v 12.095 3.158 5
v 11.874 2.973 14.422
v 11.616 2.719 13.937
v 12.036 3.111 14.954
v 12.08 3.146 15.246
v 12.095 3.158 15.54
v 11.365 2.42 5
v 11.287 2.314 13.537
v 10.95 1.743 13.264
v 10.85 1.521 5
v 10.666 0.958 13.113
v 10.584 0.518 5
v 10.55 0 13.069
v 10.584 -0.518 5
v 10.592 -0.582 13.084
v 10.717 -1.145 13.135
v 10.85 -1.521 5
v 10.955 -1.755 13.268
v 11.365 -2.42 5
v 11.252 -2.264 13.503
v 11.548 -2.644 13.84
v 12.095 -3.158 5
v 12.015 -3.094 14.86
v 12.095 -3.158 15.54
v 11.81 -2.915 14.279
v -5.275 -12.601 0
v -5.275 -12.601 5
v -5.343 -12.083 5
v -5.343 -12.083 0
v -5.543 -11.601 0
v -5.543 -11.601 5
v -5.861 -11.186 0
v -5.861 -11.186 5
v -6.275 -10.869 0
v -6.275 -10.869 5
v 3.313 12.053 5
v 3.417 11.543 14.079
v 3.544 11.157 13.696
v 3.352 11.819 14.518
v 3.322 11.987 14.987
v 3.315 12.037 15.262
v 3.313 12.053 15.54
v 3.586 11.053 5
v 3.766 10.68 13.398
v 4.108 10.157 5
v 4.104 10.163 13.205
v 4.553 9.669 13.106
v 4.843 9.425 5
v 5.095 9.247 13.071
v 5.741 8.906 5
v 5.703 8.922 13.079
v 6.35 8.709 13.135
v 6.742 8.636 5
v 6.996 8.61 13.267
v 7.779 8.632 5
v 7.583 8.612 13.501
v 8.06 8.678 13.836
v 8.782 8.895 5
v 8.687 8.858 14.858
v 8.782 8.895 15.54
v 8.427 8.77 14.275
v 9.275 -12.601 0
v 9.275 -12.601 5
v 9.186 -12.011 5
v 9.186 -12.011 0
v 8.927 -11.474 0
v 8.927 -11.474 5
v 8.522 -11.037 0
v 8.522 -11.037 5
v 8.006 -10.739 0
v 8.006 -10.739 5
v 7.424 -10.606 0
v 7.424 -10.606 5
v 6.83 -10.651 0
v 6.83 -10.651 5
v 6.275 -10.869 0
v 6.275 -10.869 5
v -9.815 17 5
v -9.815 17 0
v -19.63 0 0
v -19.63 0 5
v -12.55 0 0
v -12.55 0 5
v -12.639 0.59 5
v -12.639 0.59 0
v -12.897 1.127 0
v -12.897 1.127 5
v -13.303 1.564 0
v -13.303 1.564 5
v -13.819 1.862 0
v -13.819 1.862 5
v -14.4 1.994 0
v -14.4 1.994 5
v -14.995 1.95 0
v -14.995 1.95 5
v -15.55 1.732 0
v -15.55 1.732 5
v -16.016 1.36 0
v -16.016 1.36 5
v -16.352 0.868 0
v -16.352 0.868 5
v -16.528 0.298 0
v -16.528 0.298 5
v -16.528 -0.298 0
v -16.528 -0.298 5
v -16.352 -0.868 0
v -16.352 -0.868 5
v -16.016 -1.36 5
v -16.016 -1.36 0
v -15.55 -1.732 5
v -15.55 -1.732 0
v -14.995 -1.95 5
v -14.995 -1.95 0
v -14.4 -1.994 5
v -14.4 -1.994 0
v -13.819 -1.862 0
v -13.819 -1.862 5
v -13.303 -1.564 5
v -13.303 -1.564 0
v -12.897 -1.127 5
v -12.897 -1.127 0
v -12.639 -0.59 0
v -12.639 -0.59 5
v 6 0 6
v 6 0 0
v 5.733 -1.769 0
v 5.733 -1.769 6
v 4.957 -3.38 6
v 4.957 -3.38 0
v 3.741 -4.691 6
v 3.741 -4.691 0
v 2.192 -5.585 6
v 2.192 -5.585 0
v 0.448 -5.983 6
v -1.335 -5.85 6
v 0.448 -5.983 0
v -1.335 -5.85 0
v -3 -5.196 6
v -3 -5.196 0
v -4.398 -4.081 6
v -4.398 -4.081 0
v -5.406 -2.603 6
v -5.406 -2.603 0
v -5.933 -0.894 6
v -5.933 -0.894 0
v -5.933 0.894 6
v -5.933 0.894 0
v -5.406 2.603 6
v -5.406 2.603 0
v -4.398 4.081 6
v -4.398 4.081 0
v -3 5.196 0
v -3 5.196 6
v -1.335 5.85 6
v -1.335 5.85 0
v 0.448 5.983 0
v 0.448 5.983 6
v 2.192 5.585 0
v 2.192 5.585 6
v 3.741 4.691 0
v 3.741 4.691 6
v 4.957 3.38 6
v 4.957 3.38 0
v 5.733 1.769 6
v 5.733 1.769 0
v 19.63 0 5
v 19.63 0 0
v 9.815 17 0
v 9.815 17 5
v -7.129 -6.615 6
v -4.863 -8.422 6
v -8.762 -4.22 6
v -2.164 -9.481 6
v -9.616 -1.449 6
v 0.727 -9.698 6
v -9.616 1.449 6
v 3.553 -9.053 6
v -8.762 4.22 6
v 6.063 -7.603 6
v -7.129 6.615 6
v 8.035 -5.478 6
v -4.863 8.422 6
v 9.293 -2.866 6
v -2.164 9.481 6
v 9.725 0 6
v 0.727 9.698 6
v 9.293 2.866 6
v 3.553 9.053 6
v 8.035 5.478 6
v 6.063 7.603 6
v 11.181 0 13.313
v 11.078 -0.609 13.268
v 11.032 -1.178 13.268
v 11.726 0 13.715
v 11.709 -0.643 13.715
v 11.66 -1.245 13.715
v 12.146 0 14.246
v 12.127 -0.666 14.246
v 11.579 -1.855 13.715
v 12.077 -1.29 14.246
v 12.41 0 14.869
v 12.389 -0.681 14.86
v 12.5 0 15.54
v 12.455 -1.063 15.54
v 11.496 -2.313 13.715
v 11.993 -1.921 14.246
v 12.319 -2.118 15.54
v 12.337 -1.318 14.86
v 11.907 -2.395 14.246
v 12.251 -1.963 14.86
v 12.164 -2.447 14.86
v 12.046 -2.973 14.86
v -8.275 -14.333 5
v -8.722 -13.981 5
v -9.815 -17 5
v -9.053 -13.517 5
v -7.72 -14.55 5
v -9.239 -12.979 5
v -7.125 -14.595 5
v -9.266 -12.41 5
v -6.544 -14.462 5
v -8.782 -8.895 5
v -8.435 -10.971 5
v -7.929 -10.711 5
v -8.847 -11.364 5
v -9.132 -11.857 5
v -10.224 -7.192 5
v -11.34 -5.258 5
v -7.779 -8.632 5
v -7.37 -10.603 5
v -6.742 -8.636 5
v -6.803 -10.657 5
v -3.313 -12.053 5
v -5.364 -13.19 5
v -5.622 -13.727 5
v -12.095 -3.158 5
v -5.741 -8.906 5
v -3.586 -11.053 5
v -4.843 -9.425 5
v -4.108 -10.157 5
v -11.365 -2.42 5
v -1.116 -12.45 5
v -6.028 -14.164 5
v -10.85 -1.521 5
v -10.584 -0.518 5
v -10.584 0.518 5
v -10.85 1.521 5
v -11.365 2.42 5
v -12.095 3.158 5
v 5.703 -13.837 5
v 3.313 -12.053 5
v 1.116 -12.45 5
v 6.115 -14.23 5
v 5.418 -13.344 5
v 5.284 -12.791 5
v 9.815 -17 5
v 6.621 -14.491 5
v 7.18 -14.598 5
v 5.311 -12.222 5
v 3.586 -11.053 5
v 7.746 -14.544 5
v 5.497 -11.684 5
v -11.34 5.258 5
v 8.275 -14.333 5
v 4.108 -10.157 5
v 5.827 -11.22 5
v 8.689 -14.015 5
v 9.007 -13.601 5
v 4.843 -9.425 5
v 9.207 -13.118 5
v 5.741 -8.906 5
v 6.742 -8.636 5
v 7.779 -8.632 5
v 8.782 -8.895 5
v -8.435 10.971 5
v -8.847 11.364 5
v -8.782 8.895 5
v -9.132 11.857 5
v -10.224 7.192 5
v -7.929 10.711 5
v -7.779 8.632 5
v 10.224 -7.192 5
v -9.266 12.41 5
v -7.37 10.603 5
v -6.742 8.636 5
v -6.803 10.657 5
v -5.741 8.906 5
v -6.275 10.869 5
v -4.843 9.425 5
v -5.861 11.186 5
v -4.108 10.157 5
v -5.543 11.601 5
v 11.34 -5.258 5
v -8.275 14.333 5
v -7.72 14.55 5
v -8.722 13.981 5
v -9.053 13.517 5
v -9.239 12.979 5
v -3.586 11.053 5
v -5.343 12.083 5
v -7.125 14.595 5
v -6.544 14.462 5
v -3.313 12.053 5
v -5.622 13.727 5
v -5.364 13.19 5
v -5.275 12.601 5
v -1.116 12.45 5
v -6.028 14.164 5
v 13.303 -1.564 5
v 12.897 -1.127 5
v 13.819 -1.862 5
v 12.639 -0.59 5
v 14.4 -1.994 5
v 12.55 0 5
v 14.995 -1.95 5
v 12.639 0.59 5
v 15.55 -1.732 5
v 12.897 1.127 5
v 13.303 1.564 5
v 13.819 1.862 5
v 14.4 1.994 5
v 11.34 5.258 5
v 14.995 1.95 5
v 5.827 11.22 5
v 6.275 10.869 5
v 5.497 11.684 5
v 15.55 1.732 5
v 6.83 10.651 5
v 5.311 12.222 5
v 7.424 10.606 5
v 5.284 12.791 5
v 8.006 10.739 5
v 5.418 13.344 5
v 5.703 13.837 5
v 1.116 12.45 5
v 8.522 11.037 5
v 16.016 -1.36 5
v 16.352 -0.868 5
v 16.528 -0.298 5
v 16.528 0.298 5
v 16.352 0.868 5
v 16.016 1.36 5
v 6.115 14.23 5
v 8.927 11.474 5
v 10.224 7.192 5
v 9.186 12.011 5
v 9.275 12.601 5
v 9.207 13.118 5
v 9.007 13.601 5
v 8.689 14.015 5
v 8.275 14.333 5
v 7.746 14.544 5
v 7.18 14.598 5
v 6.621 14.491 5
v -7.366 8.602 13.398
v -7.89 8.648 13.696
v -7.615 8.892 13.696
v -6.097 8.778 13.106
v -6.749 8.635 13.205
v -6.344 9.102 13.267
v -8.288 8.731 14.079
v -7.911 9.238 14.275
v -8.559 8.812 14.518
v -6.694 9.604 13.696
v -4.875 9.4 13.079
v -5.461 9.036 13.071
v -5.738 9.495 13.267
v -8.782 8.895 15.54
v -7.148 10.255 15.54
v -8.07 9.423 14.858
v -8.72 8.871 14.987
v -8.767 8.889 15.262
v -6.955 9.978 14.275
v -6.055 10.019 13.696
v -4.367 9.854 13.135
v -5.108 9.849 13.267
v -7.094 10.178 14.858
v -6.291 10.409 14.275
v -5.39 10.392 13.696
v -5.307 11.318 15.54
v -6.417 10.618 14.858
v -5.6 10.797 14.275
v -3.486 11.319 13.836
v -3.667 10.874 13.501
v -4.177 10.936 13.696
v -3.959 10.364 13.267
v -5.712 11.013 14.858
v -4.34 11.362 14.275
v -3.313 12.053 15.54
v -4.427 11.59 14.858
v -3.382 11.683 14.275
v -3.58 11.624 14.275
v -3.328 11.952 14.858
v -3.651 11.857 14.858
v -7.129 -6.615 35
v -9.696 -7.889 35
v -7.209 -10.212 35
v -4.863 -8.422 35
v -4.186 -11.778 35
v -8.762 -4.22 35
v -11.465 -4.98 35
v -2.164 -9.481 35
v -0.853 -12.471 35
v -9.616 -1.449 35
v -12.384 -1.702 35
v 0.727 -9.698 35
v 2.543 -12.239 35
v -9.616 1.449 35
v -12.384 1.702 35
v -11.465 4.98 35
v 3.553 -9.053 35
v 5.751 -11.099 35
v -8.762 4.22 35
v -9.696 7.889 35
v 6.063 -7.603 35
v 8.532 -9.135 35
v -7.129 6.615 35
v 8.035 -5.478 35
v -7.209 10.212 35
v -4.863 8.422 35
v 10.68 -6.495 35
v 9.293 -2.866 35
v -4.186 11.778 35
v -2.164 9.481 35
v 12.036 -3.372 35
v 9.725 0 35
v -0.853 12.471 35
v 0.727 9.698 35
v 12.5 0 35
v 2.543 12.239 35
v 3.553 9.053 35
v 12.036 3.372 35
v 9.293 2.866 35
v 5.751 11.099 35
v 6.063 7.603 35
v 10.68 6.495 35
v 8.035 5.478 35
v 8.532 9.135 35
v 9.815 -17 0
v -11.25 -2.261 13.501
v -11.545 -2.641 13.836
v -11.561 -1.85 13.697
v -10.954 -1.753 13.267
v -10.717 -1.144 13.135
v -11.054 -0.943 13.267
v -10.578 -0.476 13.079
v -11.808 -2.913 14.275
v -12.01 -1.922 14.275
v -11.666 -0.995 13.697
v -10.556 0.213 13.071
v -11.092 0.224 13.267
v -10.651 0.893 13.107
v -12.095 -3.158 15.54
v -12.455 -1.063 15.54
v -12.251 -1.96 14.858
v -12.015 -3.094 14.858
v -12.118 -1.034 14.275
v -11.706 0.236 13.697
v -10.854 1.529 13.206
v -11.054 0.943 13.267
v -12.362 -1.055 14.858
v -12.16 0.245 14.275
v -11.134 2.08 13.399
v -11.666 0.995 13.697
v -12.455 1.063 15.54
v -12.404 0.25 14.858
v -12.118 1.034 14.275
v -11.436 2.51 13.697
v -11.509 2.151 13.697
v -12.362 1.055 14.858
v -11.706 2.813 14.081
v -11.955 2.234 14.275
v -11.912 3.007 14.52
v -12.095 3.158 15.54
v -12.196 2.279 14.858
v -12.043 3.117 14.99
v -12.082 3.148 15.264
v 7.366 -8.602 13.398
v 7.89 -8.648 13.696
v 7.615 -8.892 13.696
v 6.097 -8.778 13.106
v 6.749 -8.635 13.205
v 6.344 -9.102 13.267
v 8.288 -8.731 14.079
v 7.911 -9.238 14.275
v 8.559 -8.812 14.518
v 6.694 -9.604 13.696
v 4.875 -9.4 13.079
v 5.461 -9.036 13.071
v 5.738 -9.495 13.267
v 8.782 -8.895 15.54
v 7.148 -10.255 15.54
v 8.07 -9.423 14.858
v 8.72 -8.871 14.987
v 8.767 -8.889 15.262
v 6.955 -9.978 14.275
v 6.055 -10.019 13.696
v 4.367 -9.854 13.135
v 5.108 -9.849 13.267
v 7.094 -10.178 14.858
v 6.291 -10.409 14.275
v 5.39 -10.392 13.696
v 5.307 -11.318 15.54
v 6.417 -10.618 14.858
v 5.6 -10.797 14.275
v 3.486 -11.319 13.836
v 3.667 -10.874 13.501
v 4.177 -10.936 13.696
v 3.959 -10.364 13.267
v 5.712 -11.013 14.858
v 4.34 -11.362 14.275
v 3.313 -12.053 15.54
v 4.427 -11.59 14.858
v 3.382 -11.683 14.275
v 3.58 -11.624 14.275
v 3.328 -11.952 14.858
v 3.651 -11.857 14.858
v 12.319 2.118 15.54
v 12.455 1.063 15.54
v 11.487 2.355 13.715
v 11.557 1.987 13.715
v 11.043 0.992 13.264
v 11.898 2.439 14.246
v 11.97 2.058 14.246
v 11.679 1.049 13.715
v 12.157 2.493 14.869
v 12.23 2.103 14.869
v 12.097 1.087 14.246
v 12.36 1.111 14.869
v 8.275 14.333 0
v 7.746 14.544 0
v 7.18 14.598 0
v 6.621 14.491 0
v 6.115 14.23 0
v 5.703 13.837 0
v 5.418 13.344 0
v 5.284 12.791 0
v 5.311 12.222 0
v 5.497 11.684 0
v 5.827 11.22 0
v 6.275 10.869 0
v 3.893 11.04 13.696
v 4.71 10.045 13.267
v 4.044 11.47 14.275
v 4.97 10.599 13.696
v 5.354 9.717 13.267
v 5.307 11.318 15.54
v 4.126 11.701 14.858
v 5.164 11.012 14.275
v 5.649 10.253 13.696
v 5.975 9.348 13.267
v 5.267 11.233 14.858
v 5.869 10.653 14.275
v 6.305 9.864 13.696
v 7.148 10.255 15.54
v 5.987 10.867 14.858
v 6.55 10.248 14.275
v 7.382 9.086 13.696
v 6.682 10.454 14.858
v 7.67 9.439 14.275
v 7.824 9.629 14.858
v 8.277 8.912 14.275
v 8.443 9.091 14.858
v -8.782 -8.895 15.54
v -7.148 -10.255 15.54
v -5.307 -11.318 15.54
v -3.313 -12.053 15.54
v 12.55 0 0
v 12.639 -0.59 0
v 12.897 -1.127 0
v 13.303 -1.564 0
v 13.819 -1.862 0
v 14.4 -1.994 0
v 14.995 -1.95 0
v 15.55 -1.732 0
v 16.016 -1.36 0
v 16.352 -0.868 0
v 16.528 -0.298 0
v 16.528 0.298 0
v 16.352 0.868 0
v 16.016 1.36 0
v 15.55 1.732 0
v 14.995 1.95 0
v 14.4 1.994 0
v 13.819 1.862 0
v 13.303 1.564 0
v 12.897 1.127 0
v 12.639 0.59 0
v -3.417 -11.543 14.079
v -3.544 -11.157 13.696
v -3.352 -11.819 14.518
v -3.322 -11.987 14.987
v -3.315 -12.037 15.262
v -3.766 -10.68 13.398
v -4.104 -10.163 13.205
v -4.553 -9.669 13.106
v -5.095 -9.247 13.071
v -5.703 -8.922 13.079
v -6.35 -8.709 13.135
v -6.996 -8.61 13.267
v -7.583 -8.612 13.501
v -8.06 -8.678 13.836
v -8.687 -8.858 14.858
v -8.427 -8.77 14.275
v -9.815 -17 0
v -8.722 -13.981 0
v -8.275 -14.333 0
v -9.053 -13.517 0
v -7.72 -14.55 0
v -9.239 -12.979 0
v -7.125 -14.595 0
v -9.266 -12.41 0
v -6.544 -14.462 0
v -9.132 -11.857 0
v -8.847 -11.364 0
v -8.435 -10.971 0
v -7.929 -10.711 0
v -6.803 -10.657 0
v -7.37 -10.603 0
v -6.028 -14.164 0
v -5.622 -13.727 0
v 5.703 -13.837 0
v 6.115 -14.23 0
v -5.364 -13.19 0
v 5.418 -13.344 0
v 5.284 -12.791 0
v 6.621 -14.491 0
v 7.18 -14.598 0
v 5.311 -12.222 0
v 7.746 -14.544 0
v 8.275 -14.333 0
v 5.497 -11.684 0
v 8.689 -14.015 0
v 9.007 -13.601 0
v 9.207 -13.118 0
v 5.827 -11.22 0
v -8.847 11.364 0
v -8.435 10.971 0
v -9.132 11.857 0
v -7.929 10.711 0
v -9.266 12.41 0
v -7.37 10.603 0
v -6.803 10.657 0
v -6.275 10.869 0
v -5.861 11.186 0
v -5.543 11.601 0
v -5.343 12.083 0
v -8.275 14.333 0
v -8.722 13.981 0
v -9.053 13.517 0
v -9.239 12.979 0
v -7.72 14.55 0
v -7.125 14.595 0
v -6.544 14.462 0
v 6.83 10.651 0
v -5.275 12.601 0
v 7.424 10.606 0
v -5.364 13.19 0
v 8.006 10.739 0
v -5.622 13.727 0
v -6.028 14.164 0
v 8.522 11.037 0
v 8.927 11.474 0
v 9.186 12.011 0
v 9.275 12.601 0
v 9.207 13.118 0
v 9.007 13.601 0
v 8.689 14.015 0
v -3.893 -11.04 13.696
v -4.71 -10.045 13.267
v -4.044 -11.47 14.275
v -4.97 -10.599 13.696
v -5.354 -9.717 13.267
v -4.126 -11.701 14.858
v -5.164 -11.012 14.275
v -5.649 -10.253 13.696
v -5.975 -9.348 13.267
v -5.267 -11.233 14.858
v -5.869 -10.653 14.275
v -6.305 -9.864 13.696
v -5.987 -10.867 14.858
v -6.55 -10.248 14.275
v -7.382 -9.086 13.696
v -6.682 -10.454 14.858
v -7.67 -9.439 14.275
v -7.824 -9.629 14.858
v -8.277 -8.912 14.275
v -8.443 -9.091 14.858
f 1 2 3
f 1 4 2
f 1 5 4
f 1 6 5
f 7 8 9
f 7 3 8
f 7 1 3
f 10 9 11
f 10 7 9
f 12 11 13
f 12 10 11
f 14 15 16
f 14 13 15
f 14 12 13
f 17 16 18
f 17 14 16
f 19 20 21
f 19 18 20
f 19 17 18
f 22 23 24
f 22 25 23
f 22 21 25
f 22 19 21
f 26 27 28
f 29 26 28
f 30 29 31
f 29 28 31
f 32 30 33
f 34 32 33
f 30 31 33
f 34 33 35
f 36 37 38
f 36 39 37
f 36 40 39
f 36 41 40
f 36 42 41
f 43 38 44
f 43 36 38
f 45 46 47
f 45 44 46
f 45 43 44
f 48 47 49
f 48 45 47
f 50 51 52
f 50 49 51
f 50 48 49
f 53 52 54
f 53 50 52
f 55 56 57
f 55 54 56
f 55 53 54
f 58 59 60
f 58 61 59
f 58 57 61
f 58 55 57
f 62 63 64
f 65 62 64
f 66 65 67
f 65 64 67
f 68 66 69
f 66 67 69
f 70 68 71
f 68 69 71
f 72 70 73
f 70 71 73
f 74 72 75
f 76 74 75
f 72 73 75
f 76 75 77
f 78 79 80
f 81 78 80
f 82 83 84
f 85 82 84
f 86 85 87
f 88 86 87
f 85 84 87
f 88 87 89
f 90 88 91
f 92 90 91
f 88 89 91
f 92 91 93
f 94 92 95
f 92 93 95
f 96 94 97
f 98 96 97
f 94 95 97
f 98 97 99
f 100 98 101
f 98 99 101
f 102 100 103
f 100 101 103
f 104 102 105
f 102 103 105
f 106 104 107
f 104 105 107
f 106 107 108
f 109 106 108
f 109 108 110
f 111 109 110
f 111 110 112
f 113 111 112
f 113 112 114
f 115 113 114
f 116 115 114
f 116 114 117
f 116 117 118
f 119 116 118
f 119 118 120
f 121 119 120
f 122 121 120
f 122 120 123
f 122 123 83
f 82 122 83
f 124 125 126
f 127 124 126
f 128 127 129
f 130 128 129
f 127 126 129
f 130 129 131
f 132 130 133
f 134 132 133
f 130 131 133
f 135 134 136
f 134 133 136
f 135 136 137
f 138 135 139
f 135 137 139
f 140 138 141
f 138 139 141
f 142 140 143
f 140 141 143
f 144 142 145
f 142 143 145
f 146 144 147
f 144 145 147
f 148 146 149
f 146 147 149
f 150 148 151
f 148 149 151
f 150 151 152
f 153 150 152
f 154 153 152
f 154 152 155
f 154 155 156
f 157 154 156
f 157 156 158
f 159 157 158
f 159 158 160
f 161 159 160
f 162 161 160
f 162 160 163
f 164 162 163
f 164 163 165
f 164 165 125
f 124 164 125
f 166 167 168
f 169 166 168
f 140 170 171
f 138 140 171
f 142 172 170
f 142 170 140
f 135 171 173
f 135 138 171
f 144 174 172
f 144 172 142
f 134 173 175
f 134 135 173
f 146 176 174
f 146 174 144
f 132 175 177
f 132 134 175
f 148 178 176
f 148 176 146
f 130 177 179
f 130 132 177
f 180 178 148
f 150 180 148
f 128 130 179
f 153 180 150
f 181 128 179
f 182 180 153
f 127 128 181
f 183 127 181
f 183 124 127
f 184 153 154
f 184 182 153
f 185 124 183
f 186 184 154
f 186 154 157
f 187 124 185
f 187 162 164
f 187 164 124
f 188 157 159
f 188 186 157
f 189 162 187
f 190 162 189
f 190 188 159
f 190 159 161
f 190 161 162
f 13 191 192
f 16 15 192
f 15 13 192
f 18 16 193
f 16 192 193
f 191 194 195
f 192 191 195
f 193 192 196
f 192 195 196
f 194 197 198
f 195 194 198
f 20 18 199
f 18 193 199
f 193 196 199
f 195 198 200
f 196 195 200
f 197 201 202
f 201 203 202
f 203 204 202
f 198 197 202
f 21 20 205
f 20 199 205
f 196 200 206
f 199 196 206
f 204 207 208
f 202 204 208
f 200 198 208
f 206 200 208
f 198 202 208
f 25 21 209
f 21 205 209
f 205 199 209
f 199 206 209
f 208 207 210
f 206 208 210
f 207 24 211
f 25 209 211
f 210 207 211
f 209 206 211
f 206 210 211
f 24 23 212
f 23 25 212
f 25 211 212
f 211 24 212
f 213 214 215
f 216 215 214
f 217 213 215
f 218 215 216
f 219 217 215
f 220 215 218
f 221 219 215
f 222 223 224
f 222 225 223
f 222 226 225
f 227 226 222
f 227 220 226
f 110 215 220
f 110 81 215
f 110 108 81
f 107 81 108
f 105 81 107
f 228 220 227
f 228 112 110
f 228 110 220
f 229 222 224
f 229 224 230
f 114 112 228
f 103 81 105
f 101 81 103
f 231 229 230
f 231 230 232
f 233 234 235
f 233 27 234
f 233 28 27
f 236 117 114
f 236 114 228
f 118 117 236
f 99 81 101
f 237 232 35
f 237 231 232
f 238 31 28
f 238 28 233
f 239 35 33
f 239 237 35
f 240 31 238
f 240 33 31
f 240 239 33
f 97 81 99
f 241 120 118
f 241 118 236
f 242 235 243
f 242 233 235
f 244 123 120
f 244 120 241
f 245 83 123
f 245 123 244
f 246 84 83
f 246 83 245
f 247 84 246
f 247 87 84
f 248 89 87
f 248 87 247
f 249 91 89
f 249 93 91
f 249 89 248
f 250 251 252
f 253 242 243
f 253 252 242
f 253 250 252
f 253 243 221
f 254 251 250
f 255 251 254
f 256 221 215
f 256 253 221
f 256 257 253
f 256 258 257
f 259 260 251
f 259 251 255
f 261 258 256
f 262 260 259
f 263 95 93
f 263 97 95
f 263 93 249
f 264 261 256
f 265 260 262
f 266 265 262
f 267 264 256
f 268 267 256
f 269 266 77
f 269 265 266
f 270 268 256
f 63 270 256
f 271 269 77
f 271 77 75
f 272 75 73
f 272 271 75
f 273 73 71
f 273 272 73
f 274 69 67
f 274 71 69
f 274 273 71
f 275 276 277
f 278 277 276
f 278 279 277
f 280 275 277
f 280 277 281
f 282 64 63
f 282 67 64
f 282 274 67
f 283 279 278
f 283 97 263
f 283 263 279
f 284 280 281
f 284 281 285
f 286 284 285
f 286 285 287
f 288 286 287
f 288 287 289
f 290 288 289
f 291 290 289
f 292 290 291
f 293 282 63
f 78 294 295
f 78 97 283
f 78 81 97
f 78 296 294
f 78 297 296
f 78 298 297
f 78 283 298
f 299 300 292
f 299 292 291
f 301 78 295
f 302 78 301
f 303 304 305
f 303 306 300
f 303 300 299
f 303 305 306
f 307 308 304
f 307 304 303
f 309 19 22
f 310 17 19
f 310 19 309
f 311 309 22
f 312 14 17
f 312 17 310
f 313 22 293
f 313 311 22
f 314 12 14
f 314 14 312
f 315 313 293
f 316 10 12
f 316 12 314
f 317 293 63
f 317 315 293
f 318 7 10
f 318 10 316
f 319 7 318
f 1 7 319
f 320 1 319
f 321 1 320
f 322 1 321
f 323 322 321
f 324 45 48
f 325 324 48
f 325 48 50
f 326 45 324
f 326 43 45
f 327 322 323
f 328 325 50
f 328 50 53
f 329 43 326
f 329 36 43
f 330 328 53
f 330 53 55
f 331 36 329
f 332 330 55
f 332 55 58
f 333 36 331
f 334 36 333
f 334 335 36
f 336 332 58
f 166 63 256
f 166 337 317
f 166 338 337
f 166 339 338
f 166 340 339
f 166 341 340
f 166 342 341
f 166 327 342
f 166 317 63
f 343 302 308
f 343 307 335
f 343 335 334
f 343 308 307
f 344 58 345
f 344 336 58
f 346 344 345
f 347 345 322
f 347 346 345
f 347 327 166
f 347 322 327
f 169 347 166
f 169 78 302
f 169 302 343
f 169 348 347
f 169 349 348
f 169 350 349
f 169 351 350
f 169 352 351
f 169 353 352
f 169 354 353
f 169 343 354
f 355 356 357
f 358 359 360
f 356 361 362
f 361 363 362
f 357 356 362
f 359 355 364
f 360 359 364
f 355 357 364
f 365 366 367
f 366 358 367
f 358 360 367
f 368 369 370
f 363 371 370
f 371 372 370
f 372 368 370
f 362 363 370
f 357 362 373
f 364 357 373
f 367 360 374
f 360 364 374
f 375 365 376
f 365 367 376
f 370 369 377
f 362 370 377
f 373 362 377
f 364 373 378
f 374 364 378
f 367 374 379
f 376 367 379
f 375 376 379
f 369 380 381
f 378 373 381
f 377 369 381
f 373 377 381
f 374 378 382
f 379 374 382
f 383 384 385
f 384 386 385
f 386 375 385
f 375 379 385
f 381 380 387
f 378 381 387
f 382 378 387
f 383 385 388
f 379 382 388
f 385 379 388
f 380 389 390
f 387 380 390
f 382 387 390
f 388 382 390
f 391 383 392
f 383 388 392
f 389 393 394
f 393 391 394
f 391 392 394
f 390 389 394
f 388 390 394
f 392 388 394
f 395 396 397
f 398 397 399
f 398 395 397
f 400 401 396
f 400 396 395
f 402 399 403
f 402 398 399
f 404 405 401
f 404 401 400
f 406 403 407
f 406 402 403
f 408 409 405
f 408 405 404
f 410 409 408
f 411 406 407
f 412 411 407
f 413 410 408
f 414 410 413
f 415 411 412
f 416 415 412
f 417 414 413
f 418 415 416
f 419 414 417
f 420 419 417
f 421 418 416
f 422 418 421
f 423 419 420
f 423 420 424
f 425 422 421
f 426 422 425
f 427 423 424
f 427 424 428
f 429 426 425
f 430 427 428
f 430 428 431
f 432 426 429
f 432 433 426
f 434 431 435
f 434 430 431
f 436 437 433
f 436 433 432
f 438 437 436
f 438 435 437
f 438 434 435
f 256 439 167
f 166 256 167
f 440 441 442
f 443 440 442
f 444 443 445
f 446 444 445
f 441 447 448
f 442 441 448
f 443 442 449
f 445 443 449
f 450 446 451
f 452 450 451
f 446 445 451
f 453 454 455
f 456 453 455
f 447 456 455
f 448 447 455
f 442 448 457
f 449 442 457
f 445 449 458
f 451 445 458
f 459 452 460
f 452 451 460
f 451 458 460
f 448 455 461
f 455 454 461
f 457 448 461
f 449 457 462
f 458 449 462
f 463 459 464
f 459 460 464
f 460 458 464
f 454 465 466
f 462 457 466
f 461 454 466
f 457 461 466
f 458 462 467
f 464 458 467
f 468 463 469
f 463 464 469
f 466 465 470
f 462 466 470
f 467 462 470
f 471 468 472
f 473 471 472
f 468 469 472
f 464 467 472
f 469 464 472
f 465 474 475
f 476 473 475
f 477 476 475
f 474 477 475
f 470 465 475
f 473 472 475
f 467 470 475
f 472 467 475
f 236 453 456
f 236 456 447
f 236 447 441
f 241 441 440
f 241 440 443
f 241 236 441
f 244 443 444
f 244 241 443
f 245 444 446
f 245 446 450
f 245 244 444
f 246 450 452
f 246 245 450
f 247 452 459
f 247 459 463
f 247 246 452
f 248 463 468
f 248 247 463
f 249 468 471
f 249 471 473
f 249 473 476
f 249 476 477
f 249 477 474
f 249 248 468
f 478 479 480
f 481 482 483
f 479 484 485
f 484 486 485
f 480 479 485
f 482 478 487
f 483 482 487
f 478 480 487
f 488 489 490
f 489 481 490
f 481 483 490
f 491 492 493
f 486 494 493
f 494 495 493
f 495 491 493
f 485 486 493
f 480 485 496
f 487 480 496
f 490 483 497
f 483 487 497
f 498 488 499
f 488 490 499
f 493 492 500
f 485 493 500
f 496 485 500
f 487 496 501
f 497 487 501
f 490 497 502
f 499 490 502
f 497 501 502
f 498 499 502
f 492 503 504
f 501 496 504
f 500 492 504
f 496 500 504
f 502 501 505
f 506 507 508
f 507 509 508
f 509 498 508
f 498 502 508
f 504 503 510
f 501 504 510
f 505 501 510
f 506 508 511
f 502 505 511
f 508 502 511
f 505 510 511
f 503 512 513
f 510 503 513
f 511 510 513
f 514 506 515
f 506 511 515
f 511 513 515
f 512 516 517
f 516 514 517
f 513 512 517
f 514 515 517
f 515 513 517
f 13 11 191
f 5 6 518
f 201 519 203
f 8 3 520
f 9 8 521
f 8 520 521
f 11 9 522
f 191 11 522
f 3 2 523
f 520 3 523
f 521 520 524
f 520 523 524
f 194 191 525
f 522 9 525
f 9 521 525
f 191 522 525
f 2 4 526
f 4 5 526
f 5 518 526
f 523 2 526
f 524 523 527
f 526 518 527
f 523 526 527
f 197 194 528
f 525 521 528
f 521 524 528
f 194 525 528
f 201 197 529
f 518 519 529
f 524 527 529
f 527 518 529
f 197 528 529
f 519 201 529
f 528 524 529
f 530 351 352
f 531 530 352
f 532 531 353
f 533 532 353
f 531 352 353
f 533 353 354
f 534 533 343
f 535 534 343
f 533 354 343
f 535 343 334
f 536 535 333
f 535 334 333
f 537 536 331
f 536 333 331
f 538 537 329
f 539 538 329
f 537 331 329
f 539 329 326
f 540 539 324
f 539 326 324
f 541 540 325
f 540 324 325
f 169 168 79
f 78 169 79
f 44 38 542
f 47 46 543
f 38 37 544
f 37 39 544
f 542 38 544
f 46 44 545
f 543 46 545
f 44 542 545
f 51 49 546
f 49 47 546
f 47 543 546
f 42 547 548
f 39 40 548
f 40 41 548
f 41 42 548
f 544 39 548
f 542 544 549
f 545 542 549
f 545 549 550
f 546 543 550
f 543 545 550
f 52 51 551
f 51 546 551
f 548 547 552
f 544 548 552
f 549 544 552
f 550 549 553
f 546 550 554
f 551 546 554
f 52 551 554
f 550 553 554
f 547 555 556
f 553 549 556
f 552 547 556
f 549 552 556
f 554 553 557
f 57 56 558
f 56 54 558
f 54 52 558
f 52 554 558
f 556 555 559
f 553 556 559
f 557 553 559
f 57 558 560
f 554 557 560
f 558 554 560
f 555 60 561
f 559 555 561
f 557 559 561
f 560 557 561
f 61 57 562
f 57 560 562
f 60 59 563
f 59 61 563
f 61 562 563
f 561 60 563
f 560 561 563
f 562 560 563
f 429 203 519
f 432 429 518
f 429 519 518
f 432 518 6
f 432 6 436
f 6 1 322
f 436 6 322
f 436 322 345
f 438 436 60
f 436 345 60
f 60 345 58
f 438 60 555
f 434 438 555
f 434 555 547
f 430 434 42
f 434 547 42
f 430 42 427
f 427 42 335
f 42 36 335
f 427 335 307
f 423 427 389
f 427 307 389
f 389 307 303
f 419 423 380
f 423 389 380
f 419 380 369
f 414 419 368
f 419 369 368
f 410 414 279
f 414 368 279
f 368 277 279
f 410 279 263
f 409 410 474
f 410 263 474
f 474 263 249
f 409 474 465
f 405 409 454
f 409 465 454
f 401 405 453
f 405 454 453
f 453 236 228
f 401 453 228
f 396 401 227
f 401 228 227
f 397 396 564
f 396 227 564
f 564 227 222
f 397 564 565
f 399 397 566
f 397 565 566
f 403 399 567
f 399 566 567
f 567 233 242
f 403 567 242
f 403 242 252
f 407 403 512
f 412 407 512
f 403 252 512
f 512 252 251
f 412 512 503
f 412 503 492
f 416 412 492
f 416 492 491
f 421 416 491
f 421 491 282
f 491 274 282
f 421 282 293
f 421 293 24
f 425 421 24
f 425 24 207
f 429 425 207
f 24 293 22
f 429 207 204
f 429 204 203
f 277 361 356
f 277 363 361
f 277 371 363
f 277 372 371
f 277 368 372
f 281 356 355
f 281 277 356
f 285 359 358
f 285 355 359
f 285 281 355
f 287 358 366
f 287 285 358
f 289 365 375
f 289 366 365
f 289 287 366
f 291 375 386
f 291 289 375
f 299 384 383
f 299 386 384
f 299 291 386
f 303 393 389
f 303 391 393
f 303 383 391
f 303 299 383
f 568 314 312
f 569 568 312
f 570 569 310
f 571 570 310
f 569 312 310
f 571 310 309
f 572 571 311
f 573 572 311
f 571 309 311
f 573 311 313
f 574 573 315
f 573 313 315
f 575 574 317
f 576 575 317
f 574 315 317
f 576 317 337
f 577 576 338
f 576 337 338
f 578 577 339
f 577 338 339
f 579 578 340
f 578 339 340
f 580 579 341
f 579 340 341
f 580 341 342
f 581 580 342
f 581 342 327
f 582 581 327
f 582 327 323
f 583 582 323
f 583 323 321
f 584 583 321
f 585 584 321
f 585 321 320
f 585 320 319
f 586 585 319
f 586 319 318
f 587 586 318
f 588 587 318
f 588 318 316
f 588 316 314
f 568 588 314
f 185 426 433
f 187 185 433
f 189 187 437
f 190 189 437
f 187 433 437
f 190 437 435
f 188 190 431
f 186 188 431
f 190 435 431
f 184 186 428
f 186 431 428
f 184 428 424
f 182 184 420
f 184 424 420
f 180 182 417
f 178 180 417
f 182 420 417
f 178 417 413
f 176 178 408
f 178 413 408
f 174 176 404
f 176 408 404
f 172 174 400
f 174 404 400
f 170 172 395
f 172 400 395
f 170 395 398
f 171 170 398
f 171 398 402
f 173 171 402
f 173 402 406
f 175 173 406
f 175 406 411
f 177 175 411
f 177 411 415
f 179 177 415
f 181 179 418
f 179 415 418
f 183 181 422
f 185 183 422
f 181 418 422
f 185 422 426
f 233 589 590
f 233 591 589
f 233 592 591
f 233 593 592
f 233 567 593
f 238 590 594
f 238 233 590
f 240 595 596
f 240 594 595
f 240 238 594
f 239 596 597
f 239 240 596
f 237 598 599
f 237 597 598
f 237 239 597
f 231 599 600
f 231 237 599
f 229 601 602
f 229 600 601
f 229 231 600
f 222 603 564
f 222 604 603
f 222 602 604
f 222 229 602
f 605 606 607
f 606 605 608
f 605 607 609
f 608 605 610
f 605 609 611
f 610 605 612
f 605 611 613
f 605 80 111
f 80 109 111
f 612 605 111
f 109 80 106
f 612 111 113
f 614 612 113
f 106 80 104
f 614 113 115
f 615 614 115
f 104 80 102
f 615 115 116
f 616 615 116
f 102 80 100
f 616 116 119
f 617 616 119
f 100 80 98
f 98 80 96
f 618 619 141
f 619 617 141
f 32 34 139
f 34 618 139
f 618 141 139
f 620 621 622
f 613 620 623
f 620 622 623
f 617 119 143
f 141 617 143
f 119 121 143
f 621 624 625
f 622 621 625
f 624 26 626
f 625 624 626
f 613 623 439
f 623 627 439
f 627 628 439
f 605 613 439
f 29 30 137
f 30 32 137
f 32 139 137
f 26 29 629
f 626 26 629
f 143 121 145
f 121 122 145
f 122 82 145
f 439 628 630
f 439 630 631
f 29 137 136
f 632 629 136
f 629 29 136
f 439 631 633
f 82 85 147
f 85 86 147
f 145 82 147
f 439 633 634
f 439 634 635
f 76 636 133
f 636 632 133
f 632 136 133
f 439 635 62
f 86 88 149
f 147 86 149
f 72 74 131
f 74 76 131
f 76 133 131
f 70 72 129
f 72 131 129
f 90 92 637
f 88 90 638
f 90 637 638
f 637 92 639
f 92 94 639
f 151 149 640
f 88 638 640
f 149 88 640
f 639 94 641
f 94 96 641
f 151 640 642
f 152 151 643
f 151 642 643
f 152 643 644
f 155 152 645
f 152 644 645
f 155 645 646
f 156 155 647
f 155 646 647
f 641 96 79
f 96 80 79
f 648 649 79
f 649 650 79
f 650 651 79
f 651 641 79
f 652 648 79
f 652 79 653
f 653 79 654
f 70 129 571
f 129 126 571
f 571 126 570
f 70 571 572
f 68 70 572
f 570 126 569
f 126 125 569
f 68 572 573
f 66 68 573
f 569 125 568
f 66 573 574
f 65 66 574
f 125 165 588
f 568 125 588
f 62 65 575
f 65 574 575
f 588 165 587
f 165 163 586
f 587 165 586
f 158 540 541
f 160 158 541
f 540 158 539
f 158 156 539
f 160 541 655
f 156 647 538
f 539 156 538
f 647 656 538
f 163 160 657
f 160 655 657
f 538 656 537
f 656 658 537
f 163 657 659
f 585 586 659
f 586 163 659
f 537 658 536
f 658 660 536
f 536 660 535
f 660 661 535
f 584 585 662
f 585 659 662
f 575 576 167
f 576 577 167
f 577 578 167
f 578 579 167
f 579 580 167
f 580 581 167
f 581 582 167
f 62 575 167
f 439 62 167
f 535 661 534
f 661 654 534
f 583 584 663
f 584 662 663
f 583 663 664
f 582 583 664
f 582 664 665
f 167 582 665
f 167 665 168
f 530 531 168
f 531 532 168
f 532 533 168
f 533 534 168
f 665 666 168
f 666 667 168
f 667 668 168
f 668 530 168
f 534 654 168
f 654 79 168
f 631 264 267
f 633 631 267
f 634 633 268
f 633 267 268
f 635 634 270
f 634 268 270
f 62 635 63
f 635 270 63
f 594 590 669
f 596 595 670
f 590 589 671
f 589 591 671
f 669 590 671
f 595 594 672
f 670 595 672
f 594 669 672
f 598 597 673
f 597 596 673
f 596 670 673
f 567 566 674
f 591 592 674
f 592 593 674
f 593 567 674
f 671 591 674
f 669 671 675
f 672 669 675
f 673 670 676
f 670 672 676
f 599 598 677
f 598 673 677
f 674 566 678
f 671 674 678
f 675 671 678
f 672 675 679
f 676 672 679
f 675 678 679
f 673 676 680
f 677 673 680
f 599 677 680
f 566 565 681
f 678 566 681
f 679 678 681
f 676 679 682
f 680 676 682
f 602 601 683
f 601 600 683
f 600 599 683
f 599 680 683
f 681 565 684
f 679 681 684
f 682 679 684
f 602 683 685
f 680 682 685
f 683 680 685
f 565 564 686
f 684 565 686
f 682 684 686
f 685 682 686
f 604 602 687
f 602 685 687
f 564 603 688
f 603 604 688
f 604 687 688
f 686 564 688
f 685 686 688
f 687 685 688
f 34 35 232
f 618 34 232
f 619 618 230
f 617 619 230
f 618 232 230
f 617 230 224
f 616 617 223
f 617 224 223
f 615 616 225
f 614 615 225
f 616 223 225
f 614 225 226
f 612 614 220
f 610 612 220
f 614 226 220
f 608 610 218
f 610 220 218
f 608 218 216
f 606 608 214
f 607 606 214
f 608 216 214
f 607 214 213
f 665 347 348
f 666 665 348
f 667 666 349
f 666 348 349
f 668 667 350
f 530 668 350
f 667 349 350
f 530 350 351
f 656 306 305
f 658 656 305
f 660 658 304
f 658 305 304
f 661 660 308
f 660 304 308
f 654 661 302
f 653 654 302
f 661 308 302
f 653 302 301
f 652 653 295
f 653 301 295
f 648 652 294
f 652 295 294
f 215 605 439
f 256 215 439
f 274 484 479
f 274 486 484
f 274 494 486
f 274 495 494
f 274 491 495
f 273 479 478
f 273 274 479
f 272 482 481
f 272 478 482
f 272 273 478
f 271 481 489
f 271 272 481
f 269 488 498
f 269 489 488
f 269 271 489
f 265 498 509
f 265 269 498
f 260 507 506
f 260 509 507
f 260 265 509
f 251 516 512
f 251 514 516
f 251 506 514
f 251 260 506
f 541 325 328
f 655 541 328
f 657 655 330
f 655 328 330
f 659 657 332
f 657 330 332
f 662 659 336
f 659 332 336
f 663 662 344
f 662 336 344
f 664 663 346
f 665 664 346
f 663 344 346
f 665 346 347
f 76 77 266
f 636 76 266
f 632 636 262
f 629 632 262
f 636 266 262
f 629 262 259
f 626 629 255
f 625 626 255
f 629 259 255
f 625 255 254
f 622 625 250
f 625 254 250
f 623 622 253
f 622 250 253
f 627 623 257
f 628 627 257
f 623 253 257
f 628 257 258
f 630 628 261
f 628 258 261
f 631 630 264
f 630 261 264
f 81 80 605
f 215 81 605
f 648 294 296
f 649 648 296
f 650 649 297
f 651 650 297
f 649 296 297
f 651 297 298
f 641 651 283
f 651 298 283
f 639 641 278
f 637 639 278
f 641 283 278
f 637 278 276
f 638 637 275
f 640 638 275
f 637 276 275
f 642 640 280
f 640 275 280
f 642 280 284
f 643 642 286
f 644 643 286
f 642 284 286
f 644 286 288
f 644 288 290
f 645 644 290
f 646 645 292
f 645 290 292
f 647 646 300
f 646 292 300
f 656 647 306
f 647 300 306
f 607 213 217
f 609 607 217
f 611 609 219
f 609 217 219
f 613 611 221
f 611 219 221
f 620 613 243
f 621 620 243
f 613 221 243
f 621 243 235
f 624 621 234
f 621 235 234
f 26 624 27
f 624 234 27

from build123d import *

# Parameters (mm, degrees)
F1_DEPTH      = 5
F2_R          = 12.5
F3_DEPTH      = 30
F4_R          = 9.725
F5_DEPTH      = 29
F6_R          = 6
F7_DEPTH      = 25.4
F9_DEPTH      = 25.4
F10_R         = 4
F11_DEPTH     = 8
F12_T4_ANGLE  = 87.4800969246
F12_S5_R      = 4
F12_T6_DEPTH  = 12
F12_T10_ANGLE = 87.4800969246
F12_S11_R     = 4
F12_T12_DEPTH = 11
F12_T16_ANGLE = 87.4800969246
F12_S17_R     = 4
F12_T18_DEPTH = 11
F12_T22_ANGLE = 43.739121488
F12_S23_R     = 4
F12_T24_DEPTH = 8
F12_T28_ANGLE = 43.739121488
F12_S29_R     = 4
F12_T30_DEPTH = 8
F12_T34_ANGLE = 87.4800969246
F12_S35_R     = 4
F12_T36_DEPTH = 11
F12_T40_ANGLE = 87.4800969246
F12_S41_R     = 4
F12_T42_DEPTH = 11


# Not quite as in the source:
# - a fillet or chamfer that OpenCascade refuses, or shapes differently, is made with other operations: its cross-section is extruded or revolved along the edge and cut away or added


with BuildPart() as f1:
    # F0 (on Top) → F1 (new body)
    with BuildSketch(Plane.XY):
        Polygon((9.8149545762, 17), (-9.8149545762, 17), (-19.6299091524, 0), (-9.8149545762, -17), (9.8149545762, -17), (19.6299091524, 0), align=None)
    extrude(amount=F1_DEPTH)

    # F2 (on face) → F3 (join)
    with BuildSketch(Plane.XY.offset(5)):
        Circle(F2_R)
    extrude(amount=F3_DEPTH)

    # F4 (on face) → F5 (cut)
    with BuildSketch(Plane.XY.offset(35)):
        Circle(F4_R)
    extrude(amount=-F5_DEPTH, mode=Mode.SUBTRACT)

    # F6 (on face) → F7 (cut)
    with BuildSketch(Plane(origin=(0, 0, 0), x_dir=(1, 0, 0), z_dir=(0, 0, -1))):
        Circle(F6_R)
    extrude(amount=-F7_DEPTH, mode=Mode.SUBTRACT)

    # F8 (on face) → F9 (cut)
    with BuildSketch(Plane.XY.offset(5)):
        with BuildLine():
            ThreePointArc((-6.2749545762, 10.8685401412), (-5.5429037687, 11.6005909488), (-5.2749545762, 12.6005909488))
            ThreePointArc((-5.2749545762, 12.6005909488), (-6.2749545762, 14.3326417563), (-8.2749545762, 14.3326417563))
            Line((-8.2749545762, 14.3326417563), (-6.2749545762, 10.8685401412))
        make_face()
        with BuildLine():
            ThreePointArc((8.2749545762, 14.3326417563), (5.5429037687, 13.6005909488), (6.2749545762, 10.8685401412))
            Line((6.2749545762, 10.8685401412), (8.2749545762, 14.3326417563))
        make_face()
        with BuildLine():
            Line((8.2749545762, 14.3326417563), (6.2749545762, 10.8685401412))
            ThreePointArc((6.2749545762, 10.8685401412), (8.2749545762, 10.8685401412), (9.2749545762, 12.6005909488))
            ThreePointArc((9.2749545762, 12.6005909488), (9.0070053838, 13.6005909488), (8.2749545762, 14.3326417563))
        make_face()
        with BuildLine():
            ThreePointArc((16.5499091524, 0), (14.5499091524, 2), (12.5499091524, 0))
            Line((12.5499091524, 0), (16.5499091524, 0))
        make_face()
        with BuildLine():
            Line((16.5499091524, 0), (12.5499091524, 0))
            ThreePointArc((12.5499091524, 0), (14.5499091524, -2), (16.5499091524, 0))
        make_face()
        with BuildLine():
            ThreePointArc((9.2749545762, -12.6005909488), (8.2749545762, -10.8685401412), (6.2749545762, -10.8685401412))
            Line((6.2749545762, -10.8685401412), (8.2749545762, -14.3326417563))
            ThreePointArc((8.2749545762, -14.3326417563), (9.0070053838, -13.6005909488), (9.2749545762, -12.6005909488))
        make_face()
        with BuildLine():
            Line((8.2749545762, -14.3326417563), (6.2749545762, -10.8685401412))
            ThreePointArc((6.2749545762, -10.8685401412), (5.5429037687, -13.6005909488), (8.2749545762, -14.3326417563))
        make_face()
        with BuildLine():
            ThreePointArc((-5.2749545762, -12.6005909488), (-5.5429037687, -11.6005909488), (-6.2749545762, -10.8685401412))
            Line((-6.2749545762, -10.8685401412), (-8.2749545762, -14.3326417563))
            ThreePointArc((-8.2749545762, -14.3326417563), (-6.2749545762, -14.3326417563), (-5.2749545762, -12.6005909488))
        make_face()
        with BuildLine():
            Line((-8.2749545762, -14.3326417563), (-6.2749545762, -10.8685401412))
            ThreePointArc((-6.2749545762, -10.8685401412), (-9.0070053838, -11.6005909488), (-8.2749545762, -14.3326417563))
        make_face()
        with BuildLine():
            ThreePointArc((-16.5499091524, 0), (-14.5499091524, -2), (-12.5499091524, 0))
            Line((-12.5499091524, 0), (-16.5499091524, 0))
        make_face()
        with BuildLine():
            Line((-16.5499091524, 0), (-12.5499091524, 0))
            ThreePointArc((-12.5499091524, 0), (-14.5499091524, 2), (-16.5499091524, 0))
        make_face()
        with BuildLine():
            Line((-6.2749545762, 10.8685401412), (-8.2749545762, 14.3326417563))
            ThreePointArc((-8.2749545762, 14.3326417563), (-9.0070053838, 11.6005909488), (-6.2749545762, 10.8685401412))
        make_face()
    extrude(amount=-F9_DEPTH, mode=Mode.SUBTRACT)

    # F10 (on face) → F11 (cut)
    with BuildSketch(Plane.XY.offset(5)):
        with Locations((-7.2749545762, -12.6005909488)):
            Circle(F10_R)
        with Locations((-14.5499091524, 0)):
            Circle(F10_R)
        with Locations((-7.2749545762, 12.6005909488)):
            Circle(F10_R)
        with Locations((7.2749545762, 12.6005909488)):
            Circle(F10_R)
        with Locations((14.5499091524, 0)):
            Circle(F10_R)
        with Locations((7.2749545762, -12.6005909488)):
            Circle(F10_R)
    extrude(amount=F11_DEPTH, mode=Mode.SUBTRACT)

    # F12: fillet of radius 2.54 on 7 edges, made by hand


with BuildPart() as f12_tool2:
    # F12_s3 → F12_t4 (revolve)
    with BuildSketch(Plane(origin=(0, 0, 0), x_dir=(0, 0, 1), z_dir=(0.6913875801, -0.7224840581, 0))):
        with BuildLine():
            ThreePointArc((13, 9.96), (13.7439487758, 11.7560512242), (15.54, 12.5))
            Line((15.54, 12.5), (13, 12.5))
            Line((13, 12.5), (13, 9.96))
        make_face()
    revolve(axis=Axis((0, 0, 13), (0, 0, -1)), revolution_arc=F12_T4_ANGLE)

    # F12_s5 → F12_t6 (intersect, symmetric)
    with BuildSketch(Plane.XY.offset(15.2)):
        with Locations((-14.5499091524, 0)):
            Circle(F12_S5_R)
    extrude(amount=F12_T6_DEPTH, both=True, mode=Mode.INTERSECT)


with BuildPart() as f1_1:
    add(f1.part)

    # F12_t1: cut F12_tool2
    add(f12_tool2.part, mode=Mode.SUBTRACT)


with BuildPart() as f12_tool8:
    # F12_s9 → F12_t10 (revolve)
    with BuildSketch(Plane(origin=(0, 0, 0), x_dir=(0, 0, 1), z_dir=(0.9713833381, 0.2375171792, 0))):
        with BuildLine():
            ThreePointArc((13, 9.96), (13.7439487758, 11.7560512242), (15.54, 12.5))
            Line((15.54, 12.5), (13, 12.5))
            Line((13, 12.5), (13, 9.96))
        make_face()
    revolve(axis=Axis((0, 0, 13), (0, 0, -1)), revolution_arc=F12_T10_ANGLE)

    # F12_s11 → F12_t12 (intersect, symmetric)
    with BuildSketch(Plane.XY.offset(15.2)):
        with Locations((-7.2749545762, -12.6005909488)):
            Circle(F12_S11_R)
    extrude(amount=F12_T12_DEPTH, both=True, mode=Mode.INTERSECT)


with BuildPart() as f1_2:
    add(f1_1.part)

    # F12_t7: cut F12_tool8
    add(f12_tool8.part, mode=Mode.SUBTRACT)


with BuildPart() as f12_tool14:
    # F12_s15 → F12_t16 (revolve)
    with BuildSketch(Plane(origin=(0, 0, 0), x_dir=(0, 0, 1), z_dir=(0.2799957581, 0.9600012372, 0))):
        with BuildLine():
            ThreePointArc((13, 9.96), (13.7439487758, 11.7560512242), (15.54, 12.5))
            Line((15.54, 12.5), (13, 12.5))
            Line((13, 12.5), (13, 9.96))
        make_face()
    revolve(axis=Axis((0, 0, 13), (0, 0, -1)), revolution_arc=F12_T16_ANGLE)

    # F12_s17 → F12_t18 (intersect, symmetric)
    with BuildSketch(Plane.XY.offset(15.2)):
        with Locations((7.2749545762, -12.6005909488)):
            Circle(F12_S17_R)
    extrude(amount=F12_T18_DEPTH, both=True, mode=Mode.INTERSECT)


with BuildPart() as f1_3:
    add(f1_2.part)

    # F12_t13: cut F12_tool14
    add(f12_tool14.part, mode=Mode.SUBTRACT)


with BuildPart() as f12_tool20:
    # F12_s21 → F12_t22 (revolve)
    with BuildSketch(Plane(origin=(0, 0, 0), x_dir=(0, 0, 1), z_dir=(-0.6913758911, 0.7224952438, 0))):
        with BuildLine():
            ThreePointArc((13, 9.96), (13.7439487758, 11.7560512242), (15.54, 12.5))
            Line((15.54, 12.5), (13, 12.5))
            Line((13, 12.5), (13, 9.96))
        make_face()
    revolve(axis=Axis((0, 0, 13), (0, 0, -1)), revolution_arc=F12_T22_ANGLE)

    # F12_s23 → F12_t24 (intersect, symmetric)
    with BuildSketch(Plane.XY.offset(15.2)):
        with Locations((14.5499091524, 0)):
            Circle(F12_S23_R)
    extrude(amount=F12_T24_DEPTH, both=True, mode=Mode.INTERSECT)


with BuildPart() as f1_4:
    add(f1_3.part)

    # F12_t19: cut F12_tool20
    add(f12_tool20.part, mode=Mode.SUBTRACT)


with BuildPart() as f12_tool26:
    # F12_s27 → F12_t28 (revolve)
    with BuildSketch(Plane.XZ):
        with BuildLine():
            ThreePointArc((9.96, 13), (11.7560512242, 13.7439487758), (12.5, 15.54))
            Line((12.5, 15.54), (12.5, 13))
            Line((12.5, 13), (9.96, 13))
        make_face()
    revolve(axis=Axis((0, 0, 13), (0, 0, -1)), revolution_arc=F12_T28_ANGLE)

    # F12_s29 → F12_t30 (intersect, symmetric)
    with BuildSketch(Plane.XY.offset(15.2)):
        with Locations((14.5499091524, 0)):
            Circle(F12_S29_R)
    extrude(amount=F12_T30_DEPTH, both=True, mode=Mode.INTERSECT)


with BuildPart() as f1_5:
    add(f1_4.part)

    # F12_t25: cut F12_tool26
    add(f12_tool26.part, mode=Mode.SUBTRACT)


with BuildPart() as f12_tool32:
    # F12_s33 → F12_t34 (revolve)
    with BuildSketch(Plane(origin=(0, 0, 0), x_dir=(0, 0, 1), z_dir=(-0.9713833381, -0.2375171792, 0))):
        with BuildLine():
            ThreePointArc((13, 9.96), (13.7439487758, 11.7560512242), (15.54, 12.5))
            Line((15.54, 12.5), (13, 12.5))
            Line((13, 12.5), (13, 9.96))
        make_face()
    revolve(axis=Axis((0, 0, 13), (0, 0, -1)), revolution_arc=F12_T34_ANGLE)

    # F12_s35 → F12_t36 (intersect, symmetric)
    with BuildSketch(Plane.XY.offset(15.2)):
        with Locations((7.2749545762, 12.6005909488)):
            Circle(F12_S35_R)
    extrude(amount=F12_T36_DEPTH, both=True, mode=Mode.INTERSECT)


with BuildPart() as f1_6:
    add(f1_5.part)

    # F12_t31: cut F12_tool32
    add(f12_tool32.part, mode=Mode.SUBTRACT)


with BuildPart() as f12_tool38:
    # F12_s39 → F12_t40 (revolve)
    with BuildSketch(Plane(origin=(0, 0, 0), x_dir=(0, 0, 1), z_dir=(-0.2799957581, -0.9600012372, 0))):
        with BuildLine():
            ThreePointArc((13, 9.96), (13.7439487758, 11.7560512242), (15.54, 12.5))
            Line((15.54, 12.5), (13, 12.5))
            Line((13, 12.5), (13, 9.96))
        make_face()
    revolve(axis=Axis((0, 0, 13), (0, 0, -1)), revolution_arc=F12_T40_ANGLE)

    # F12_s41 → F12_t42 (intersect, symmetric)
    with BuildSketch(Plane.XY.offset(15.2)):
        with Locations((-7.2749545762, 12.6005909488)):
            Circle(F12_S41_R)
    extrude(amount=F12_T42_DEPTH, both=True, mode=Mode.INTERSECT)


with BuildPart() as f1_7:
    add(f1_6.part)

    # F12_t37: cut F12_tool38
    add(f12_tool38.part, mode=Mode.SUBTRACT)


solid = f1_7.part
